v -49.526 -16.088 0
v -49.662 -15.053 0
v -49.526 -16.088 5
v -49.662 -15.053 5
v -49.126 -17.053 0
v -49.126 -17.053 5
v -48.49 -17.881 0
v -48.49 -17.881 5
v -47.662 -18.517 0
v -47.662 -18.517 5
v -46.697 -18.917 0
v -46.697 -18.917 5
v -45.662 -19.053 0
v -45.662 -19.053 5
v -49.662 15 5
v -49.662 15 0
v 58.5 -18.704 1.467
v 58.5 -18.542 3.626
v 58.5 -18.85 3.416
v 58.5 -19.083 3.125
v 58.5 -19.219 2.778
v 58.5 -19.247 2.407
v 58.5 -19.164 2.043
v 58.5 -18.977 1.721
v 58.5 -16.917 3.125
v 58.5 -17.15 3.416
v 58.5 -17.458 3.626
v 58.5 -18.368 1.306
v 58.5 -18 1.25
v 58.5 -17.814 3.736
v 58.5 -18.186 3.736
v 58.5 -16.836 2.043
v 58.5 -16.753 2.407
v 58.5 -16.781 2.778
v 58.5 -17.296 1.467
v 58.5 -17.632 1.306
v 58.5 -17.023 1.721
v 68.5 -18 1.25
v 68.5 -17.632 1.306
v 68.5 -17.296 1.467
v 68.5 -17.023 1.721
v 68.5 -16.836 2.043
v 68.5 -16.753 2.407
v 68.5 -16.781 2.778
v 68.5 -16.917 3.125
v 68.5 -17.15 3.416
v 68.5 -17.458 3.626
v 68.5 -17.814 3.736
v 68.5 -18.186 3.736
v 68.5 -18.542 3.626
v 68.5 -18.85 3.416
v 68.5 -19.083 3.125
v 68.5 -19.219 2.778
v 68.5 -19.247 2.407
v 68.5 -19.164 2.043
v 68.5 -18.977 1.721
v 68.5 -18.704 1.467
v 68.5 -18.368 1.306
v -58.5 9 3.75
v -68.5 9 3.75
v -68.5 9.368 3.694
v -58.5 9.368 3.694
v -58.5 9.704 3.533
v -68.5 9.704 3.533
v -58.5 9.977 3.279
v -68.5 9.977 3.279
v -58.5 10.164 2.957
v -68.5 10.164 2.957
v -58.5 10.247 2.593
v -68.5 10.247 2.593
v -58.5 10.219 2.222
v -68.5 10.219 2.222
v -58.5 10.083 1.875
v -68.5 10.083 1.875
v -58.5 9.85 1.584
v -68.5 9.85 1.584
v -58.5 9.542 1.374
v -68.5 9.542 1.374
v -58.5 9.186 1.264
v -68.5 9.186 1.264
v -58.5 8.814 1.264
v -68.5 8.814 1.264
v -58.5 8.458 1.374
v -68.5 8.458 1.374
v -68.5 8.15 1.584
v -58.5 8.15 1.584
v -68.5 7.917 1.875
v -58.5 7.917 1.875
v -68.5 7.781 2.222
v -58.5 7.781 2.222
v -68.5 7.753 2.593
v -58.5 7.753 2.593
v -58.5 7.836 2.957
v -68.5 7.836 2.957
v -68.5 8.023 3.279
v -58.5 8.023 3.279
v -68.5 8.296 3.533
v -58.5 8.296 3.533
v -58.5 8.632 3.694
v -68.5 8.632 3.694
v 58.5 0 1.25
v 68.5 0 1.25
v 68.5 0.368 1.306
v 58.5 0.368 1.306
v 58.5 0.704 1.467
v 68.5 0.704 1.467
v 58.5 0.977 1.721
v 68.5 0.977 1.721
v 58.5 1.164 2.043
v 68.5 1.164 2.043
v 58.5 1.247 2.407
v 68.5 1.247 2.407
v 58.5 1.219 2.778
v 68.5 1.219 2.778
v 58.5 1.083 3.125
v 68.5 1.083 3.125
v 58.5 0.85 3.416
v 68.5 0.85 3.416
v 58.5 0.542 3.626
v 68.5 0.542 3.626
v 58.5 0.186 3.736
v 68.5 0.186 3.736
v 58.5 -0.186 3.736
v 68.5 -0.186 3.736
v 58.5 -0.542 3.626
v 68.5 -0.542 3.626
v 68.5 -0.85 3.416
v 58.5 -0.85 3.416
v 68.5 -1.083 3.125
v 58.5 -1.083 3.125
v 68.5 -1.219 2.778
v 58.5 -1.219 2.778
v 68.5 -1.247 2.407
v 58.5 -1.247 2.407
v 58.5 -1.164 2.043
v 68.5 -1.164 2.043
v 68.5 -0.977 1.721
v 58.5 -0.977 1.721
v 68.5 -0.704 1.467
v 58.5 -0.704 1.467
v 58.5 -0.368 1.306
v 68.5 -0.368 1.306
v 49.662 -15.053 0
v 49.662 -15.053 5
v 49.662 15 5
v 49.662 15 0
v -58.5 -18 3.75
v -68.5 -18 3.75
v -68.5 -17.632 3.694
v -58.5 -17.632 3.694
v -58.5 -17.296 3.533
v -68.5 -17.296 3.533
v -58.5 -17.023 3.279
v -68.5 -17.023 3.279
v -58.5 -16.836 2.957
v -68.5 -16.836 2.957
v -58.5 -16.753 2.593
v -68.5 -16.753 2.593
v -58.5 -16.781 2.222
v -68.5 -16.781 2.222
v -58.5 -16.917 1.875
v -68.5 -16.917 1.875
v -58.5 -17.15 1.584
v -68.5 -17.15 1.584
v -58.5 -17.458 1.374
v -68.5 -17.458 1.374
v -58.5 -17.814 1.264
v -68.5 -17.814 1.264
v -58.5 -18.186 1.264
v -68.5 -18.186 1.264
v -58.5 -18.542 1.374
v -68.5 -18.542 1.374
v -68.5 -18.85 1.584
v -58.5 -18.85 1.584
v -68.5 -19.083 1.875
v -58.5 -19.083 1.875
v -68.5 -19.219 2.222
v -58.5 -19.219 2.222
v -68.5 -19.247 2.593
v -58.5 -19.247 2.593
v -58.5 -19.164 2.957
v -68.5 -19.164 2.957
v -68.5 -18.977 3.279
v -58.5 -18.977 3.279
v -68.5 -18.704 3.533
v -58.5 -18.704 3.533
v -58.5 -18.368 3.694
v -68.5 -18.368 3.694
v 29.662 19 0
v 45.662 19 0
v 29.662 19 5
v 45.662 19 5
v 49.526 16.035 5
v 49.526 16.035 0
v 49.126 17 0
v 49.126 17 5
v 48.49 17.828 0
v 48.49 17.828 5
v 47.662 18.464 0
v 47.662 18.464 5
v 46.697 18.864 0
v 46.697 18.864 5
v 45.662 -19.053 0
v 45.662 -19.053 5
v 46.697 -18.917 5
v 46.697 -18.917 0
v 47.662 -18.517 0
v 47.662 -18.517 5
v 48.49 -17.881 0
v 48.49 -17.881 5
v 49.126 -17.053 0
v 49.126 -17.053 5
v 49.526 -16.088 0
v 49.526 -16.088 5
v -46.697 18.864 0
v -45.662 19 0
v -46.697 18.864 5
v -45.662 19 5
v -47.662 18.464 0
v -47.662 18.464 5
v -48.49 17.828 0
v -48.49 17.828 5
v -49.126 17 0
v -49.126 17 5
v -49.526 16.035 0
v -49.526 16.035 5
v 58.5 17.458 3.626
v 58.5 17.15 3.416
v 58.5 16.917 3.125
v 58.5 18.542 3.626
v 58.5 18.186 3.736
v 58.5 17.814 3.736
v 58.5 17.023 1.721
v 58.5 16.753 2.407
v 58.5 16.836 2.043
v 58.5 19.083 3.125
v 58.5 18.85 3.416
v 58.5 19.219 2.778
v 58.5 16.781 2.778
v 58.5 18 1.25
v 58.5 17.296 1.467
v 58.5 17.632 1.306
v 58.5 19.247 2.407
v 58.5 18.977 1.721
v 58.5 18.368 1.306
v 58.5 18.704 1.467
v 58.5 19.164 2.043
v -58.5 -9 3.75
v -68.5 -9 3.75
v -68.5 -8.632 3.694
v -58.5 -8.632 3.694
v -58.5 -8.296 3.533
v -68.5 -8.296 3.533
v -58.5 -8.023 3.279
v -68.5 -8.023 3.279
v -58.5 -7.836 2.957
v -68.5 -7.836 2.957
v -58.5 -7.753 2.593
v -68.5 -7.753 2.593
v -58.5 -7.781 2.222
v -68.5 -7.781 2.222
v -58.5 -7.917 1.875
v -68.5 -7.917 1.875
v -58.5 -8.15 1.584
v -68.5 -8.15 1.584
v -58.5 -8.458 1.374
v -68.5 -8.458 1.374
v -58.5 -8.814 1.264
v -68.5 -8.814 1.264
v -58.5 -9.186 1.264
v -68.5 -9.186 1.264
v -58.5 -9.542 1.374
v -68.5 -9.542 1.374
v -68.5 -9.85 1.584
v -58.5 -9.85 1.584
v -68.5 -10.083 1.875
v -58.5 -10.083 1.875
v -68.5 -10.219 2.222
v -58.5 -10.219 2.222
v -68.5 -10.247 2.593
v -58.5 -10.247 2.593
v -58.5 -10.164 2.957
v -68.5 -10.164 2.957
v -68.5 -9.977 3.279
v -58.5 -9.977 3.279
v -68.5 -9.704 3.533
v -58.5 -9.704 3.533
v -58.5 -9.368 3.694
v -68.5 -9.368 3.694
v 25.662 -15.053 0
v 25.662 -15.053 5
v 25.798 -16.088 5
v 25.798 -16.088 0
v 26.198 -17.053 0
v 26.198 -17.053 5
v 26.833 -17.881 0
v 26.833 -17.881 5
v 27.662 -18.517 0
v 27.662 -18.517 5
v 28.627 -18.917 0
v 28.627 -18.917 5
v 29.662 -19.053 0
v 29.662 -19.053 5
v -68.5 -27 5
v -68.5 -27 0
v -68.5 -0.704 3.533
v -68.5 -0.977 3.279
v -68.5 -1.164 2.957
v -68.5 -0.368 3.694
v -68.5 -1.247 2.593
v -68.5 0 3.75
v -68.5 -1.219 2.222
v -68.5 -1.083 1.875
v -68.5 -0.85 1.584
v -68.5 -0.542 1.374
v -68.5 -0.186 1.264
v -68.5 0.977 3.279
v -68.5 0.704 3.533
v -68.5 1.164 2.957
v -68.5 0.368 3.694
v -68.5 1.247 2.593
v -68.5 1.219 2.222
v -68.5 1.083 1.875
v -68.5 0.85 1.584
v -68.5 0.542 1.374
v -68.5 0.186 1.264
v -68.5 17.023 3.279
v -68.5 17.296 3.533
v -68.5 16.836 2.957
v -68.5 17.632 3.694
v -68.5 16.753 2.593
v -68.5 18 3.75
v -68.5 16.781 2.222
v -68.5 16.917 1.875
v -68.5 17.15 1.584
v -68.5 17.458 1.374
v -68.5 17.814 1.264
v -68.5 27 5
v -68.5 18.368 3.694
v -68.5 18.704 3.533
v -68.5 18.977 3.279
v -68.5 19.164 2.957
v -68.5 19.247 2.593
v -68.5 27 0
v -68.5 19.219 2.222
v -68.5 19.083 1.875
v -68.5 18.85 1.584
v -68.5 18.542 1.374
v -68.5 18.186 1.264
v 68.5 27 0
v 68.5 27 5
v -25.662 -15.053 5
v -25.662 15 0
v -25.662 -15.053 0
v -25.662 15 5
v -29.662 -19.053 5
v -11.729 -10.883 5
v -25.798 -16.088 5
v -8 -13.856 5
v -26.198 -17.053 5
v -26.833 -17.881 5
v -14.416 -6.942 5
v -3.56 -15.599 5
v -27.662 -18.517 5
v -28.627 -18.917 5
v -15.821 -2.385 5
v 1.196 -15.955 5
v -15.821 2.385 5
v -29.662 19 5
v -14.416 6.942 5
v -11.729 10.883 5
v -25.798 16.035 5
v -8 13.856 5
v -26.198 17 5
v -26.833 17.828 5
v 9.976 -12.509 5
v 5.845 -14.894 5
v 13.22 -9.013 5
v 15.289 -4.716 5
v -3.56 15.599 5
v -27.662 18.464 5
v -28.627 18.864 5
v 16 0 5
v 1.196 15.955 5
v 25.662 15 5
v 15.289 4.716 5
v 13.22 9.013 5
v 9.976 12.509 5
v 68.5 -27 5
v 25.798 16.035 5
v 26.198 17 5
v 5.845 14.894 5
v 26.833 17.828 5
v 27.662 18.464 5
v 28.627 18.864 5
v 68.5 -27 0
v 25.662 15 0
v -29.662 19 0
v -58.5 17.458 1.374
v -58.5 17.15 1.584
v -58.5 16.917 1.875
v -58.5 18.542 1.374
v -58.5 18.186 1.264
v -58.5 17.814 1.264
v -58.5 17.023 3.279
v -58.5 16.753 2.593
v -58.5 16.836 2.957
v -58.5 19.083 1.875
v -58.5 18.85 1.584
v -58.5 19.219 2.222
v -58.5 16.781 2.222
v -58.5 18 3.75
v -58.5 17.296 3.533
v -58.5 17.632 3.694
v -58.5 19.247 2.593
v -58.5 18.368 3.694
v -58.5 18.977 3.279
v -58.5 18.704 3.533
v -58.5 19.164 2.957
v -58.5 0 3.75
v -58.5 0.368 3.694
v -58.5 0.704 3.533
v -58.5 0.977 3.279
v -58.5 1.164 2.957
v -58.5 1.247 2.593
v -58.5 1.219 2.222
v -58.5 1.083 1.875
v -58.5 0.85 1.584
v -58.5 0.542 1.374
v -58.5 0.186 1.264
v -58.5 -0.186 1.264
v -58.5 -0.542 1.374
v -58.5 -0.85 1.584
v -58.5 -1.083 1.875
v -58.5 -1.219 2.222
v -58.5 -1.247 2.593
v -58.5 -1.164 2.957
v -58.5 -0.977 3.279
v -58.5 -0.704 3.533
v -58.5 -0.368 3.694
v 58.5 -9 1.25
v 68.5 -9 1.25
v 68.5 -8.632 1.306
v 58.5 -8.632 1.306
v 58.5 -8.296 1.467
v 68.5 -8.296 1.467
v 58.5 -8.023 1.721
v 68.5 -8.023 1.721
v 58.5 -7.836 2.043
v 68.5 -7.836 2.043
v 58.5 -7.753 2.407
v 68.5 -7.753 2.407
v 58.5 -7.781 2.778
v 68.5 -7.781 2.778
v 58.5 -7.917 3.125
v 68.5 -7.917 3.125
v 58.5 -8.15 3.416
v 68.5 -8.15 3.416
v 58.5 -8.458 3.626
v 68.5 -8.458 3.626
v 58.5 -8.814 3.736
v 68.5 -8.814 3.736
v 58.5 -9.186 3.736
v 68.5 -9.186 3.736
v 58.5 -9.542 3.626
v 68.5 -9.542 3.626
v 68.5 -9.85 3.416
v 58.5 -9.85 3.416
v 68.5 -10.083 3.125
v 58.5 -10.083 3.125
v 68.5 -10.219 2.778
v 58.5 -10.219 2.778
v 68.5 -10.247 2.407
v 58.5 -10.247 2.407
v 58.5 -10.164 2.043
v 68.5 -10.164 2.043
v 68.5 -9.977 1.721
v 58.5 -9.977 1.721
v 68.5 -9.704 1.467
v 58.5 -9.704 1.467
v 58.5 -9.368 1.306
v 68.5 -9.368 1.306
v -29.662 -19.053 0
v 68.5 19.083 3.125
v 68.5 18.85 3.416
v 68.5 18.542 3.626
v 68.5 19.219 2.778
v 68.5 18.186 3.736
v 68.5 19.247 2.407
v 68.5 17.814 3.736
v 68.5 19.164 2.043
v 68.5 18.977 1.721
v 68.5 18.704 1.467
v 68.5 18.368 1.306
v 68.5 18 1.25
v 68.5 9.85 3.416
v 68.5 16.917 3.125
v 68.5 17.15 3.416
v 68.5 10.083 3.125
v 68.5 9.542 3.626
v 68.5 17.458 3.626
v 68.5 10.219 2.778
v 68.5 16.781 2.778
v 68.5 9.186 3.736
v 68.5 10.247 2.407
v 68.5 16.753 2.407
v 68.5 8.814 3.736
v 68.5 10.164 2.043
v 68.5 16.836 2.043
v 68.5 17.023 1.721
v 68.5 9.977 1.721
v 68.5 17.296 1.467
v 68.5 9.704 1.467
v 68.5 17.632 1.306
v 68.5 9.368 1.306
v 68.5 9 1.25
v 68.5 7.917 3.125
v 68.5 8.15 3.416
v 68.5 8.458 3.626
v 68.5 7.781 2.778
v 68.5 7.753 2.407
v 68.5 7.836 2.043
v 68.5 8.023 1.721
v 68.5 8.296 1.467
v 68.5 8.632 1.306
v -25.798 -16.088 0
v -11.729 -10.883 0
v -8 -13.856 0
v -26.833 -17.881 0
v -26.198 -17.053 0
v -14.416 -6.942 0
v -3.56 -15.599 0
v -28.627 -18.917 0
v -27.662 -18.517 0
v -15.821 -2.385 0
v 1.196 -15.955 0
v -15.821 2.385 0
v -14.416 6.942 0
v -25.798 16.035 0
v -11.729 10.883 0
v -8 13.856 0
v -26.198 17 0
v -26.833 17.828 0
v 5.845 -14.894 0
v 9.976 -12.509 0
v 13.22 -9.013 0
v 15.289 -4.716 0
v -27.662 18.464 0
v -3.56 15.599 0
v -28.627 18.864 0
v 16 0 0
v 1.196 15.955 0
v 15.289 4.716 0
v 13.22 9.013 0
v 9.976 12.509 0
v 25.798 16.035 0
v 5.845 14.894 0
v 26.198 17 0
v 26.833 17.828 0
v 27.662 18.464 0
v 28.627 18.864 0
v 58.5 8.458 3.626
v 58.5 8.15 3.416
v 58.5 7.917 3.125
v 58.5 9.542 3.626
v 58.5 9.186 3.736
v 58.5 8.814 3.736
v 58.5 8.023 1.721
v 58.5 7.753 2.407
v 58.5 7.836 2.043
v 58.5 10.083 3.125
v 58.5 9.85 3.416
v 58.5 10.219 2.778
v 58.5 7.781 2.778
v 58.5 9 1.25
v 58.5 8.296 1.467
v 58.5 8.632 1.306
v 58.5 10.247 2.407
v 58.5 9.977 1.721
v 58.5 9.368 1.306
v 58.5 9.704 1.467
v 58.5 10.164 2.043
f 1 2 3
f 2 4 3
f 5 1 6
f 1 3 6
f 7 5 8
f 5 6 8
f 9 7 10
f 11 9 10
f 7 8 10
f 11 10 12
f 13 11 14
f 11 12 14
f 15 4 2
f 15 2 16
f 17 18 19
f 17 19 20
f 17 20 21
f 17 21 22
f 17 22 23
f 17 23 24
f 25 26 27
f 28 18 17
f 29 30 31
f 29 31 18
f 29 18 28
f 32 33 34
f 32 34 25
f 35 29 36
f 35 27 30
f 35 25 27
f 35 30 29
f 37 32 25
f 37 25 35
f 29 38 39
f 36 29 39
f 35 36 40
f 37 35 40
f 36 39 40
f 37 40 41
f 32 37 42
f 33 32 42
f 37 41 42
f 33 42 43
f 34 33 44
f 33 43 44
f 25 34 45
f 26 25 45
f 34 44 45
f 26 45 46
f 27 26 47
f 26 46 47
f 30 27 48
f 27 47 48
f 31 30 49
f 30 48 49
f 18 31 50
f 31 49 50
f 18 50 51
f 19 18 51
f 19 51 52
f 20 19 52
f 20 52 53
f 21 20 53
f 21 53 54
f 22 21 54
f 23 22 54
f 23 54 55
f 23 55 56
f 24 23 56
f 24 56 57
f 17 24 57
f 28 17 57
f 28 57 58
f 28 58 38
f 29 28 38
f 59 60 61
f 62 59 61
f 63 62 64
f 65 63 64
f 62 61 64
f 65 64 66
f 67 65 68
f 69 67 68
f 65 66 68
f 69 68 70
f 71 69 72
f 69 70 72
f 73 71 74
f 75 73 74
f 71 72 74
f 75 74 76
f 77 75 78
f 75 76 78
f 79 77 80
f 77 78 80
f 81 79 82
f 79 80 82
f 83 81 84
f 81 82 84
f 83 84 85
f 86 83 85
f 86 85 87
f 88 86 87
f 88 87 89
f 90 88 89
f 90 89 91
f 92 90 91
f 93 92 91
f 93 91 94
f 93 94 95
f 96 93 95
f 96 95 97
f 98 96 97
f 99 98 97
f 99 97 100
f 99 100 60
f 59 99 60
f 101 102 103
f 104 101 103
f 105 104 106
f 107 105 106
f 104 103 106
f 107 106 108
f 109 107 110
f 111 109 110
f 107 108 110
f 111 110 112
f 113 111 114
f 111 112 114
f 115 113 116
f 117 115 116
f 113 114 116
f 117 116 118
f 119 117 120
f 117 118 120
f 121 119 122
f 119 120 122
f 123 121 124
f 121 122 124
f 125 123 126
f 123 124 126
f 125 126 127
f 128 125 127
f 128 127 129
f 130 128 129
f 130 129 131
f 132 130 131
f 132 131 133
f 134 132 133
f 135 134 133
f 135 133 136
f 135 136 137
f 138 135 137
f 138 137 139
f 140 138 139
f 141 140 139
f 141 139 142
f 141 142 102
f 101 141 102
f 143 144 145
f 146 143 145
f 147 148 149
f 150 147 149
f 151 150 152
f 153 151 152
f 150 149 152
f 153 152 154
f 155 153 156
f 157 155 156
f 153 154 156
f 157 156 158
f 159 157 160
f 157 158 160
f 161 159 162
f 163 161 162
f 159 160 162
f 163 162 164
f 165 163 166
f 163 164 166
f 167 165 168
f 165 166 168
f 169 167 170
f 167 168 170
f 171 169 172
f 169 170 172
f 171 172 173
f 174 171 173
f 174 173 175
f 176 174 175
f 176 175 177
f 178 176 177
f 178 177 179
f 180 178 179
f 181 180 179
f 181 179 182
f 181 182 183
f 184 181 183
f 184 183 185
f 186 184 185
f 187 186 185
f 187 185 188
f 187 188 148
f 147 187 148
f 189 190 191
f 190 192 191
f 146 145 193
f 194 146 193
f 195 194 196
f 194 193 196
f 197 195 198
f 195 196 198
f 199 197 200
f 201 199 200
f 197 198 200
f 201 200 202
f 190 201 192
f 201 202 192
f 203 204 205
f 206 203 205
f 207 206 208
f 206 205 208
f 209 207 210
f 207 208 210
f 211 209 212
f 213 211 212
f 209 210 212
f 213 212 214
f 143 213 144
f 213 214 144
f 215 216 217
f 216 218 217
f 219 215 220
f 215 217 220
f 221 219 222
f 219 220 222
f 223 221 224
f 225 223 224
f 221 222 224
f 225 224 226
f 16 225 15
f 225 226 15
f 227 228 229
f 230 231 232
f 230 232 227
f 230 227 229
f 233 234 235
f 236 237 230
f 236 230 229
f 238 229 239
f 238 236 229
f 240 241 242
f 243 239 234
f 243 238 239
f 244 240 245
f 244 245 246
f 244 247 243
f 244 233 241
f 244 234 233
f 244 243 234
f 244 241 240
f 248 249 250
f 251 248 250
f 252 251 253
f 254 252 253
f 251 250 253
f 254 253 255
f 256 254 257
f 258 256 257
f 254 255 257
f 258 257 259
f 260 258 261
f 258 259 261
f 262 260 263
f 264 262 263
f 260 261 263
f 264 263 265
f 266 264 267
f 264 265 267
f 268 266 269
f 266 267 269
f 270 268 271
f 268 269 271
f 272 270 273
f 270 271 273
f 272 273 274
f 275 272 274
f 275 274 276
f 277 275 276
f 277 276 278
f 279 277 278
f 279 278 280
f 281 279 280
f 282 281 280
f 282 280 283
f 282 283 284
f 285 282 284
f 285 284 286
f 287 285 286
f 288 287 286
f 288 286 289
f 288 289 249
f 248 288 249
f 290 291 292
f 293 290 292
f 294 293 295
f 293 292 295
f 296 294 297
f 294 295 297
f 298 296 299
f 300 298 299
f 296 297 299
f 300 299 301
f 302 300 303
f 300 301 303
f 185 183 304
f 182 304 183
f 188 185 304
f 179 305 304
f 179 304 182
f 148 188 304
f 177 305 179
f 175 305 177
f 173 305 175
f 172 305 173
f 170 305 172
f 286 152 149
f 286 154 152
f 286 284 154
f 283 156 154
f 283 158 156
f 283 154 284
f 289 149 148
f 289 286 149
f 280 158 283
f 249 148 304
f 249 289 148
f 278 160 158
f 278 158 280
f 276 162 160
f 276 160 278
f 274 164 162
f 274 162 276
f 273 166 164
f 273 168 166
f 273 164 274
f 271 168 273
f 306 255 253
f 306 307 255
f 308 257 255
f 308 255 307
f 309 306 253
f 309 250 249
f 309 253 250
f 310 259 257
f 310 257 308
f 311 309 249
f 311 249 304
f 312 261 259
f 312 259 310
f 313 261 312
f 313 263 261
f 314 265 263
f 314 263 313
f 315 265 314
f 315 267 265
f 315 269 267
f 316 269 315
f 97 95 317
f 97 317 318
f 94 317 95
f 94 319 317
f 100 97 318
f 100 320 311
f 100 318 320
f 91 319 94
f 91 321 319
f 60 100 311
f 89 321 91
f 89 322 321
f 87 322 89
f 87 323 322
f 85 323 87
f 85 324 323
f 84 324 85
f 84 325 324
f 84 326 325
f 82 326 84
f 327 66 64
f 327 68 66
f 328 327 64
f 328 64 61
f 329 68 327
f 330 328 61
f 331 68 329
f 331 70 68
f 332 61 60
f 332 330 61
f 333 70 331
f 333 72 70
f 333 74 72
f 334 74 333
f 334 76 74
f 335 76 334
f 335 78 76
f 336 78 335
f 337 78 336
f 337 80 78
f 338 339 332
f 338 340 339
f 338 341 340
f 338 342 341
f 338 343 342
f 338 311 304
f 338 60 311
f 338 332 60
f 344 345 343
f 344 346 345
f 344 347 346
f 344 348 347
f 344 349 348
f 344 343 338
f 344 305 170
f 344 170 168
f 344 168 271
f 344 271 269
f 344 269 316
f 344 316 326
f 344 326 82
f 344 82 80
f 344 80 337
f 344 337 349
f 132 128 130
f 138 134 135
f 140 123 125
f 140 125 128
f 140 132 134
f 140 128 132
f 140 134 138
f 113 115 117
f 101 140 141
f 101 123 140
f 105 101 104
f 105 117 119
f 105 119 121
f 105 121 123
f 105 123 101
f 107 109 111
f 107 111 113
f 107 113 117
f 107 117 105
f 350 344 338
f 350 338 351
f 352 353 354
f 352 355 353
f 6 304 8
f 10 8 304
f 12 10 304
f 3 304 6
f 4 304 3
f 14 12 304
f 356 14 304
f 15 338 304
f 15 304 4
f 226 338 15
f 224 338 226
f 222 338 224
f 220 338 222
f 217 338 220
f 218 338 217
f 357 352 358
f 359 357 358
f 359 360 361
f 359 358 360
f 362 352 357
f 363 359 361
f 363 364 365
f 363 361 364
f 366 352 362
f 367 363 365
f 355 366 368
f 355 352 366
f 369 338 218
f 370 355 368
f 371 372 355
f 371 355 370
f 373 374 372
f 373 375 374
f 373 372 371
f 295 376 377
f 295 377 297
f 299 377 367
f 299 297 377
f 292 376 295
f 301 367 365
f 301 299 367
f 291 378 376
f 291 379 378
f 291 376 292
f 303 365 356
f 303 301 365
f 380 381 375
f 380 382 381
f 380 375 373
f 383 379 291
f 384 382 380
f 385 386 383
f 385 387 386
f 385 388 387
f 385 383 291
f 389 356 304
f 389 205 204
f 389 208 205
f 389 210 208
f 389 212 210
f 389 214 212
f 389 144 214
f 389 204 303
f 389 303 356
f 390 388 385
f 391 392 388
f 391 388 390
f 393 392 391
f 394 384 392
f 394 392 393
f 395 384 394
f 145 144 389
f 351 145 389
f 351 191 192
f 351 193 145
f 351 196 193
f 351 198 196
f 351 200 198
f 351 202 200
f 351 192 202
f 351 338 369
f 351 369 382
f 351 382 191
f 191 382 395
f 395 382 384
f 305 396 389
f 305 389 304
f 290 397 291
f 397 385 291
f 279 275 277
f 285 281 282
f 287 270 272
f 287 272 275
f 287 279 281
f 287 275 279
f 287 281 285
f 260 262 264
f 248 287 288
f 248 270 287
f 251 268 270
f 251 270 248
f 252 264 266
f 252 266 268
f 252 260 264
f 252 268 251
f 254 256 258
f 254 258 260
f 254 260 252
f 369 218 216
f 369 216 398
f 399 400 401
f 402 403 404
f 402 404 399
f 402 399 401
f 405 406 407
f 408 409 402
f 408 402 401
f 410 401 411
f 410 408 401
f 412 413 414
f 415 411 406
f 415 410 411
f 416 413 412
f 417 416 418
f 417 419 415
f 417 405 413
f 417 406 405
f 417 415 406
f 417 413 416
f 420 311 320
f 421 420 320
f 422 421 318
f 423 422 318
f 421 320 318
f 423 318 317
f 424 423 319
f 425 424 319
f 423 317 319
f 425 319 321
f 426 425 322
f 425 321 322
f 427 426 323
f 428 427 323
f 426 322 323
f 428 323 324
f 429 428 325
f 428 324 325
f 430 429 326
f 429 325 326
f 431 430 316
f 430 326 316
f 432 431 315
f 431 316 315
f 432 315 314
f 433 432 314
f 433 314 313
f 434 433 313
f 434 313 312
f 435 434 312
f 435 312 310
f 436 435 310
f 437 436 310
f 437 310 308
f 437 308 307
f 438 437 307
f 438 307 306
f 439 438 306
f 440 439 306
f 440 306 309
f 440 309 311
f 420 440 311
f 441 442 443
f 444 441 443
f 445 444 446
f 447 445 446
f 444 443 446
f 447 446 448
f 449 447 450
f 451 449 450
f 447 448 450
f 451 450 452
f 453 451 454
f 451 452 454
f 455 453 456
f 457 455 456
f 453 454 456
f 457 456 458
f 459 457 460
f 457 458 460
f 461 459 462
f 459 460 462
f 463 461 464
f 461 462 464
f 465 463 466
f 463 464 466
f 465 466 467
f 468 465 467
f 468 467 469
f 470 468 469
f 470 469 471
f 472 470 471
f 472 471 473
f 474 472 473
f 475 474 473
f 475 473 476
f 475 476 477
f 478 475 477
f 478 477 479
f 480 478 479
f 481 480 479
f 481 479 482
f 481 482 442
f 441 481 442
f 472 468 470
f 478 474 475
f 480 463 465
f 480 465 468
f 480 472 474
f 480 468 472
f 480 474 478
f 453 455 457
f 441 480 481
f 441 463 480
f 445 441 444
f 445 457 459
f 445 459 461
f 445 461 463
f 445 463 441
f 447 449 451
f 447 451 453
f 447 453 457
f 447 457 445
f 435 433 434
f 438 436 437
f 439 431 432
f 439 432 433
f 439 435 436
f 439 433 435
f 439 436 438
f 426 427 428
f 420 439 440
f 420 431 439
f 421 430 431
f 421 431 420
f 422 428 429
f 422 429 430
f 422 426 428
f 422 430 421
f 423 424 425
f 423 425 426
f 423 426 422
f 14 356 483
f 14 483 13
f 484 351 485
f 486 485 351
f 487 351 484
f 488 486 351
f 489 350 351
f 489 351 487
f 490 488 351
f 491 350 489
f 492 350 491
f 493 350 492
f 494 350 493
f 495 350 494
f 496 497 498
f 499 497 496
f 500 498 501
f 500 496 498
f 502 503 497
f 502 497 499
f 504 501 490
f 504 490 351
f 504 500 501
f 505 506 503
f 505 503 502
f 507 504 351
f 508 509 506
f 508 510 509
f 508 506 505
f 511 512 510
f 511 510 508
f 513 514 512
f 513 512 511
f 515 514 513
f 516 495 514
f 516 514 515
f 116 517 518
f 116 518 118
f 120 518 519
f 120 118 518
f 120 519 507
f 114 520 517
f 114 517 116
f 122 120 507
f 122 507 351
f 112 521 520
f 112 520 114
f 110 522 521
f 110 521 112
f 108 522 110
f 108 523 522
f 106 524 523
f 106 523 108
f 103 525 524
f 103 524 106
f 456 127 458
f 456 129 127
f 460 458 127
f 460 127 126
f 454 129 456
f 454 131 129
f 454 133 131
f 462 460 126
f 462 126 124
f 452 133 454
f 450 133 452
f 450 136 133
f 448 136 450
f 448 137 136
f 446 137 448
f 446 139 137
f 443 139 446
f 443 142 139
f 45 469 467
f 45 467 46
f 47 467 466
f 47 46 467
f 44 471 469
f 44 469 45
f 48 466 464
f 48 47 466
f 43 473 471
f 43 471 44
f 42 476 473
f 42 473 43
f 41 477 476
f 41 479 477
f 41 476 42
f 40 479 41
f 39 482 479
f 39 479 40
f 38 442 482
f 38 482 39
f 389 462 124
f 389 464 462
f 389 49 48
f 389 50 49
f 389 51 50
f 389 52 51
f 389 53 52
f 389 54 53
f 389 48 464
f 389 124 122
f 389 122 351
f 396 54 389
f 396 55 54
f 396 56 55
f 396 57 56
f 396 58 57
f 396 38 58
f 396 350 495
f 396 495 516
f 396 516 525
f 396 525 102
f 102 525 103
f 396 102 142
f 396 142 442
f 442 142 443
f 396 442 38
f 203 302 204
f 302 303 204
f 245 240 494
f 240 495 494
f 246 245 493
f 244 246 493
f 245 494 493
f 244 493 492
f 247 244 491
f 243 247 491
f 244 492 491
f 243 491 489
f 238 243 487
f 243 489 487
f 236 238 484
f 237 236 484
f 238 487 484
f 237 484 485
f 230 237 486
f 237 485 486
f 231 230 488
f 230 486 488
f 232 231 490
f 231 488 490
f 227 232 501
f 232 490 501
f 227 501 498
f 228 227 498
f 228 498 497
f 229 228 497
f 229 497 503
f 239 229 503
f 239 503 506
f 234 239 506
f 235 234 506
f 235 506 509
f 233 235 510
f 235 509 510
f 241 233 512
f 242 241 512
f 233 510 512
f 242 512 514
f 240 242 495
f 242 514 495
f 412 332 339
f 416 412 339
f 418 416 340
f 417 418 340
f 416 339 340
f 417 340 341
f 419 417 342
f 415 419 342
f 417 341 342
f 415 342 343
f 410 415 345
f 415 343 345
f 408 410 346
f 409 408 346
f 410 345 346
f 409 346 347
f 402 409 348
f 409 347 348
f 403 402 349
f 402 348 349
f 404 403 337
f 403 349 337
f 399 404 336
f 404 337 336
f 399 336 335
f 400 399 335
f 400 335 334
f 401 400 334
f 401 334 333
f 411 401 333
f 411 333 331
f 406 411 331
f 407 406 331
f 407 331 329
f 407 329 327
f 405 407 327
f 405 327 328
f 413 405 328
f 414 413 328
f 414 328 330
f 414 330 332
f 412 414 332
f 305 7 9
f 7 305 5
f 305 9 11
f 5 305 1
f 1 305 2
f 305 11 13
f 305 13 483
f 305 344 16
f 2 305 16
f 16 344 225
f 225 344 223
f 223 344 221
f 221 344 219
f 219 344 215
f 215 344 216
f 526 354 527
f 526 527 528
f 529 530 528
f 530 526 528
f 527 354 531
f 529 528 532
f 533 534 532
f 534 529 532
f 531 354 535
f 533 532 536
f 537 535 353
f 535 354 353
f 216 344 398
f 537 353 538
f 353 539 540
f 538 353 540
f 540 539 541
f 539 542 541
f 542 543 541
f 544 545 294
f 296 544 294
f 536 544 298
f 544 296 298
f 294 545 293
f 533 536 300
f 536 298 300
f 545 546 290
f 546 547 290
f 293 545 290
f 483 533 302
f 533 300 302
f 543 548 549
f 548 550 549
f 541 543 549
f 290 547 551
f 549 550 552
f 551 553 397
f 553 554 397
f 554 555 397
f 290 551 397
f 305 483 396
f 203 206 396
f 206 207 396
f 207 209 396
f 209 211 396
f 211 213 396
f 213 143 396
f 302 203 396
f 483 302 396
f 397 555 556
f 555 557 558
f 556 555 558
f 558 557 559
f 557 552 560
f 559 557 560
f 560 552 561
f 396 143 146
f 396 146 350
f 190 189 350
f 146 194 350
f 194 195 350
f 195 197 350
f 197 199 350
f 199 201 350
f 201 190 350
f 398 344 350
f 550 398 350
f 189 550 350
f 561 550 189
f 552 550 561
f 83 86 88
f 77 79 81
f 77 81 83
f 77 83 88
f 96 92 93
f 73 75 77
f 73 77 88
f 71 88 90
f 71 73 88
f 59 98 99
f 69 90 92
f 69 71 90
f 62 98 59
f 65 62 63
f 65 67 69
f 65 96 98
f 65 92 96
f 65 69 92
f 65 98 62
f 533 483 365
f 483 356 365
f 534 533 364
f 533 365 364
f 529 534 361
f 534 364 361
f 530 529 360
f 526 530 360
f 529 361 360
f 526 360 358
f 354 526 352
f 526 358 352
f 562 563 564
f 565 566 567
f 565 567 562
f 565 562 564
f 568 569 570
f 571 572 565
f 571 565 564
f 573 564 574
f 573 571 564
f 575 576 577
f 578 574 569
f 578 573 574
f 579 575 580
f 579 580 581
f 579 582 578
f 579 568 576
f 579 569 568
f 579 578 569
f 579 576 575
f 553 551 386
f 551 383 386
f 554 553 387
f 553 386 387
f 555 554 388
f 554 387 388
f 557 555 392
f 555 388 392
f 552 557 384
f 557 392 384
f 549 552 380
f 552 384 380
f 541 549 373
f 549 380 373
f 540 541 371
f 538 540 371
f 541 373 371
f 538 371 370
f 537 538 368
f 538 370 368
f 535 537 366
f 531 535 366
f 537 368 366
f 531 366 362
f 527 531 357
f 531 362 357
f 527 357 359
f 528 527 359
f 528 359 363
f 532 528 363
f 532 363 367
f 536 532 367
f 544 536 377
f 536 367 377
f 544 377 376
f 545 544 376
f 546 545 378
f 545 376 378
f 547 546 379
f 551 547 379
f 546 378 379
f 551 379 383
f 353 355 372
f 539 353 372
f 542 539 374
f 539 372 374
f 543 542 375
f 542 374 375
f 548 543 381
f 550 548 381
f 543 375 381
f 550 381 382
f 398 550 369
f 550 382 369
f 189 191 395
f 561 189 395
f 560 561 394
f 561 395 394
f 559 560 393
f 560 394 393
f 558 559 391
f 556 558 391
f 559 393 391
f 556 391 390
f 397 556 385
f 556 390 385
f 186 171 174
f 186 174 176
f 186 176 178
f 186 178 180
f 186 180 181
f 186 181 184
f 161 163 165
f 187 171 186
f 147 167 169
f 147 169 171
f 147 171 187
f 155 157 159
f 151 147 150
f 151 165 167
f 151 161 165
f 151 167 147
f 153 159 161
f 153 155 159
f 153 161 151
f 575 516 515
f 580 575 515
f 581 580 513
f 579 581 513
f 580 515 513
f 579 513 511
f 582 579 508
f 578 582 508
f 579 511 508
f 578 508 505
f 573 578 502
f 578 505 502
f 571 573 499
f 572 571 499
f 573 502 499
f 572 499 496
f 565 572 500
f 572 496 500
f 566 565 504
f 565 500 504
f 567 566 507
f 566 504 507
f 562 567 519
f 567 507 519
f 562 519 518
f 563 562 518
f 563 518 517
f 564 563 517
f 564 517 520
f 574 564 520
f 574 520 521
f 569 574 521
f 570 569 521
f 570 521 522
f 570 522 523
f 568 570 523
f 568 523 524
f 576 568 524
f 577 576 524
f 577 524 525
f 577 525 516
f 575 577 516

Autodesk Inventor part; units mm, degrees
ref_plane "YZ Plane" through (0, 0, 0) normal (1, 0, 0) x (0, 1, 0)
ref_plane "XZ Plane" through (0, 0, 0) normal (0, 1, 0) x (-1, 0, 0)
ref_plane "XY Plane" through (0, 0, 0) normal (0, 0, 1) x (1, 0, 0)
sketch "스케치1" plane through (0, 0, 0) normal (0, 0, 1) x (1, 0, 0)
  line L0 (-68.5, 27) -> (68.5, 27)
  line L1 (68.5, 27) -> (68.5, -27)
  line L2 (68.5, -27) -> (-68.5, -27)
  line L3 (-68.5, -27) -> (-68.5, 27)
  point P0 (0, 0)
  dimension "d0" = 137
  dimension "d1" = 54
  dimension "d2" = 27
  dimension "d3" = 68.5
extrude "돌출1" add sketch "스케치1" along normal blind 5
sketch "스케치2" plane through (-68.5, -27, 0) normal (-1, 0, 0) x (0, 0, 1)
  line L0 (0, 54) -> (0, 0)
  line L1 (0, 0) -> (5, 0)
  line L2 (5, 0) -> (51, 4)
  line L3 (51, 50) -> (5, 54)
  line L4 (5, 54) -> (0, 54)
  circle A0 centre (2.5, 9) radius 1.25
  circle A1 centre (2.5, 18) radius 1.25
  circle A2 centre (2.5, 27) radius 1.25
  circle A3 centre (2.5, 36) radius 1.25
  circle A4 centre (2.5, 45) radius 1.25
  line L5 (0, 0) -> (0, 54) projected
  line L6 (0, 0) -> (5, 0) projected
  line L7 (5, 54) -> (5, 0) projected
  line L8 (0, 54) -> (5, 54) projected
  point P0 (0, 27)
  dimension "d6" = 2.5
  dimension "d7" = 2.5
  dimension "d8" = 2.5
  dimension "d9" = 2.5
  dimension "d10" = 2.5
  dimension "d11" = 2.5
  dimension "d12" = 2.5
  dimension "d13" = 2.5
  dimension "d14" = 2.5
  dimension "d15" = 2.5
  dimension "d16" = 9
  dimension "d17" = 18
  dimension "d18" = 27
  dimension "d19" = 36
  dimension "d20" = 9
extrude "돌출2" cut sketch "스케치2" against normal blind 10 contours A0 | A1 | A2 | A3 | A4
sketch "스케치3" plane through (68.5, -27, 0) normal (1, 0, 0) x (0, 0, -1)
  line L0 (0, 0) -> (0, 54)
  line L1 (0, 54) -> (-5, 54)
  line L2 (-5, 54) -> (-51, 50)
  line L3 (-51, 4) -> (-5, 0)
  line L4 (-5, 0) -> (0, 0)
  circle A0 centre (-2.5, 45) radius 1.25
  circle A1 centre (-2.5, 36) radius 1.25
  circle A2 centre (-2.5, 27) radius 1.25
  circle A3 centre (-2.5, 18) radius 1.25
  circle A4 centre (-2.5, 9) radius 1.25
  line L5 (0, 54) -> (0, 0) projected
  line L6 (0, 54) -> (-5, 54) projected
  line L7 (-5, 0) -> (-5, 54) projected
  line L8 (0, 0) -> (-5, 0) projected
  point P0 (0, 27)
  dimension "d23" = 2.5
  dimension "d24" = 2.5
  dimension "d25" = 2.5
  dimension "d26" = 2.5
  dimension "d27" = 2.5
  dimension "d28" = 2.5
  dimension "d29" = 2.5
  dimension "d30" = 2.5
  dimension "d31" = 2.5
  dimension "d32" = 2.5
  dimension "d33" = 9
  dimension "d34" = 18
  dimension "d35" = 27
  dimension "d36" = 36
  dimension "d37" = 9
extrude "돌출3" cut sketch "스케치3" against normal blind 10 contours A0 | A1 | A2 | A3 | A4
sketch "스케치5" plane through (0, 0, 5) normal (0, 0, 1) x (1, 0, 0)
  line L0 (68.5, 27) -> (-68.5, 27) projected
  line L1 (-68.5, 27) -> (-68.5, -27) projected
  line L2 (-68.5, -27) -> (68.5, -27) projected
  line L3 (68.5, -27) -> (68.5, 27) projected
  line L4 (68.5, 27) -> (-68.5, 27) projected
  line L5 (-68.5, -0.0341) -> (68.5, 0) construction
  line L6 (-45.6619, 19) -> (-29.6619, 19)
  line L7 (-25.6619, 15) -> (-25.6619, -15.0528)
  line L8 (-29.6619, -19.0528) -> (-45.6619, -19.0528)
  line L9 (-49.6619, -15.0528) -> (-49.6619, 15)
  line L10 (-49.6619, 19) -> (-25.6619, -19.0528) construction
  line L11 (-25.6619, 19) -> (-49.6619, -19.0528) construction
  arc A0 (-45.6619, 19) -> (-49.6619, 15) centre (-45.6619, 15) ccw
  arc A1 (-25.6619, 15) -> (-29.6619, 19) centre (-29.6619, 15) ccw
  arc A2 (-29.6619, -19.0528) -> (-25.6619, -15.0528) centre (-29.6619, -15.0528) ccw
  arc A3 (-49.6619, -15.0528) -> (-45.6619, -19.0528) centre (-45.6619, -15.0528) ccw
  line L12 (0, 29) -> (0, -29)
  arc A4 (29.6619, 19) -> (25.6619, 15) centre (29.6619, 15) ccw
  line L13 (25.6619, 15) -> (25.6619, -15.0528)
  arc A5 (25.6619, -15.0528) -> (29.6619, -19.0528) centre (29.6619, -15.0528) ccw
  line L14 (45.6619, 19) -> (29.6619, 19)
  arc A6 (49.6619, 15) -> (45.6619, 19) centre (45.6619, 15) ccw
  line L15 (49.6619, 19) -> (25.6619, -19.0528) construction
  line L16 (25.6619, 19) -> (49.6619, -19.0528) construction
  line L17 (49.6619, -15.0528) -> (49.6619, 15)
  arc A7 (45.6619, -19.0528) -> (49.6619, -15.0528) centre (45.6619, -15.0528) ccw
  line L18 (29.6619, -19.0528) -> (45.6619, -19.0528)
  point P0 (0, 0)
  point P1 (-37.6619, -0.0264)
  point P2 (37.6619, -0.0264)
  point P3 (0, 0)
  dimension "d85" = 24
  dimension "d86" = 4
extrude "돌출4" cut sketch "스케치5" against normal up to surface (5 mm away) contours L6 A1 L7 A2 L8 A3 L9 A0 | L14 A6 L17 A7 L18 A5 L13 A4
sketch "스케치9" plane through (0, 0, 5) normal (0, 0, 1) x (1, 0, 0)
  circle A0 centre (0, 0) radius 16
  dimension "d82" = 32
extrude "돌출8" cut sketch "스케치9" against normal blind 10
equation "\"d2\" = 0.5 * d1"
equation "\"d3\" = 0.5 * d0"
properties part number "J2L1_H_Top" material "알루미늄 6061"
